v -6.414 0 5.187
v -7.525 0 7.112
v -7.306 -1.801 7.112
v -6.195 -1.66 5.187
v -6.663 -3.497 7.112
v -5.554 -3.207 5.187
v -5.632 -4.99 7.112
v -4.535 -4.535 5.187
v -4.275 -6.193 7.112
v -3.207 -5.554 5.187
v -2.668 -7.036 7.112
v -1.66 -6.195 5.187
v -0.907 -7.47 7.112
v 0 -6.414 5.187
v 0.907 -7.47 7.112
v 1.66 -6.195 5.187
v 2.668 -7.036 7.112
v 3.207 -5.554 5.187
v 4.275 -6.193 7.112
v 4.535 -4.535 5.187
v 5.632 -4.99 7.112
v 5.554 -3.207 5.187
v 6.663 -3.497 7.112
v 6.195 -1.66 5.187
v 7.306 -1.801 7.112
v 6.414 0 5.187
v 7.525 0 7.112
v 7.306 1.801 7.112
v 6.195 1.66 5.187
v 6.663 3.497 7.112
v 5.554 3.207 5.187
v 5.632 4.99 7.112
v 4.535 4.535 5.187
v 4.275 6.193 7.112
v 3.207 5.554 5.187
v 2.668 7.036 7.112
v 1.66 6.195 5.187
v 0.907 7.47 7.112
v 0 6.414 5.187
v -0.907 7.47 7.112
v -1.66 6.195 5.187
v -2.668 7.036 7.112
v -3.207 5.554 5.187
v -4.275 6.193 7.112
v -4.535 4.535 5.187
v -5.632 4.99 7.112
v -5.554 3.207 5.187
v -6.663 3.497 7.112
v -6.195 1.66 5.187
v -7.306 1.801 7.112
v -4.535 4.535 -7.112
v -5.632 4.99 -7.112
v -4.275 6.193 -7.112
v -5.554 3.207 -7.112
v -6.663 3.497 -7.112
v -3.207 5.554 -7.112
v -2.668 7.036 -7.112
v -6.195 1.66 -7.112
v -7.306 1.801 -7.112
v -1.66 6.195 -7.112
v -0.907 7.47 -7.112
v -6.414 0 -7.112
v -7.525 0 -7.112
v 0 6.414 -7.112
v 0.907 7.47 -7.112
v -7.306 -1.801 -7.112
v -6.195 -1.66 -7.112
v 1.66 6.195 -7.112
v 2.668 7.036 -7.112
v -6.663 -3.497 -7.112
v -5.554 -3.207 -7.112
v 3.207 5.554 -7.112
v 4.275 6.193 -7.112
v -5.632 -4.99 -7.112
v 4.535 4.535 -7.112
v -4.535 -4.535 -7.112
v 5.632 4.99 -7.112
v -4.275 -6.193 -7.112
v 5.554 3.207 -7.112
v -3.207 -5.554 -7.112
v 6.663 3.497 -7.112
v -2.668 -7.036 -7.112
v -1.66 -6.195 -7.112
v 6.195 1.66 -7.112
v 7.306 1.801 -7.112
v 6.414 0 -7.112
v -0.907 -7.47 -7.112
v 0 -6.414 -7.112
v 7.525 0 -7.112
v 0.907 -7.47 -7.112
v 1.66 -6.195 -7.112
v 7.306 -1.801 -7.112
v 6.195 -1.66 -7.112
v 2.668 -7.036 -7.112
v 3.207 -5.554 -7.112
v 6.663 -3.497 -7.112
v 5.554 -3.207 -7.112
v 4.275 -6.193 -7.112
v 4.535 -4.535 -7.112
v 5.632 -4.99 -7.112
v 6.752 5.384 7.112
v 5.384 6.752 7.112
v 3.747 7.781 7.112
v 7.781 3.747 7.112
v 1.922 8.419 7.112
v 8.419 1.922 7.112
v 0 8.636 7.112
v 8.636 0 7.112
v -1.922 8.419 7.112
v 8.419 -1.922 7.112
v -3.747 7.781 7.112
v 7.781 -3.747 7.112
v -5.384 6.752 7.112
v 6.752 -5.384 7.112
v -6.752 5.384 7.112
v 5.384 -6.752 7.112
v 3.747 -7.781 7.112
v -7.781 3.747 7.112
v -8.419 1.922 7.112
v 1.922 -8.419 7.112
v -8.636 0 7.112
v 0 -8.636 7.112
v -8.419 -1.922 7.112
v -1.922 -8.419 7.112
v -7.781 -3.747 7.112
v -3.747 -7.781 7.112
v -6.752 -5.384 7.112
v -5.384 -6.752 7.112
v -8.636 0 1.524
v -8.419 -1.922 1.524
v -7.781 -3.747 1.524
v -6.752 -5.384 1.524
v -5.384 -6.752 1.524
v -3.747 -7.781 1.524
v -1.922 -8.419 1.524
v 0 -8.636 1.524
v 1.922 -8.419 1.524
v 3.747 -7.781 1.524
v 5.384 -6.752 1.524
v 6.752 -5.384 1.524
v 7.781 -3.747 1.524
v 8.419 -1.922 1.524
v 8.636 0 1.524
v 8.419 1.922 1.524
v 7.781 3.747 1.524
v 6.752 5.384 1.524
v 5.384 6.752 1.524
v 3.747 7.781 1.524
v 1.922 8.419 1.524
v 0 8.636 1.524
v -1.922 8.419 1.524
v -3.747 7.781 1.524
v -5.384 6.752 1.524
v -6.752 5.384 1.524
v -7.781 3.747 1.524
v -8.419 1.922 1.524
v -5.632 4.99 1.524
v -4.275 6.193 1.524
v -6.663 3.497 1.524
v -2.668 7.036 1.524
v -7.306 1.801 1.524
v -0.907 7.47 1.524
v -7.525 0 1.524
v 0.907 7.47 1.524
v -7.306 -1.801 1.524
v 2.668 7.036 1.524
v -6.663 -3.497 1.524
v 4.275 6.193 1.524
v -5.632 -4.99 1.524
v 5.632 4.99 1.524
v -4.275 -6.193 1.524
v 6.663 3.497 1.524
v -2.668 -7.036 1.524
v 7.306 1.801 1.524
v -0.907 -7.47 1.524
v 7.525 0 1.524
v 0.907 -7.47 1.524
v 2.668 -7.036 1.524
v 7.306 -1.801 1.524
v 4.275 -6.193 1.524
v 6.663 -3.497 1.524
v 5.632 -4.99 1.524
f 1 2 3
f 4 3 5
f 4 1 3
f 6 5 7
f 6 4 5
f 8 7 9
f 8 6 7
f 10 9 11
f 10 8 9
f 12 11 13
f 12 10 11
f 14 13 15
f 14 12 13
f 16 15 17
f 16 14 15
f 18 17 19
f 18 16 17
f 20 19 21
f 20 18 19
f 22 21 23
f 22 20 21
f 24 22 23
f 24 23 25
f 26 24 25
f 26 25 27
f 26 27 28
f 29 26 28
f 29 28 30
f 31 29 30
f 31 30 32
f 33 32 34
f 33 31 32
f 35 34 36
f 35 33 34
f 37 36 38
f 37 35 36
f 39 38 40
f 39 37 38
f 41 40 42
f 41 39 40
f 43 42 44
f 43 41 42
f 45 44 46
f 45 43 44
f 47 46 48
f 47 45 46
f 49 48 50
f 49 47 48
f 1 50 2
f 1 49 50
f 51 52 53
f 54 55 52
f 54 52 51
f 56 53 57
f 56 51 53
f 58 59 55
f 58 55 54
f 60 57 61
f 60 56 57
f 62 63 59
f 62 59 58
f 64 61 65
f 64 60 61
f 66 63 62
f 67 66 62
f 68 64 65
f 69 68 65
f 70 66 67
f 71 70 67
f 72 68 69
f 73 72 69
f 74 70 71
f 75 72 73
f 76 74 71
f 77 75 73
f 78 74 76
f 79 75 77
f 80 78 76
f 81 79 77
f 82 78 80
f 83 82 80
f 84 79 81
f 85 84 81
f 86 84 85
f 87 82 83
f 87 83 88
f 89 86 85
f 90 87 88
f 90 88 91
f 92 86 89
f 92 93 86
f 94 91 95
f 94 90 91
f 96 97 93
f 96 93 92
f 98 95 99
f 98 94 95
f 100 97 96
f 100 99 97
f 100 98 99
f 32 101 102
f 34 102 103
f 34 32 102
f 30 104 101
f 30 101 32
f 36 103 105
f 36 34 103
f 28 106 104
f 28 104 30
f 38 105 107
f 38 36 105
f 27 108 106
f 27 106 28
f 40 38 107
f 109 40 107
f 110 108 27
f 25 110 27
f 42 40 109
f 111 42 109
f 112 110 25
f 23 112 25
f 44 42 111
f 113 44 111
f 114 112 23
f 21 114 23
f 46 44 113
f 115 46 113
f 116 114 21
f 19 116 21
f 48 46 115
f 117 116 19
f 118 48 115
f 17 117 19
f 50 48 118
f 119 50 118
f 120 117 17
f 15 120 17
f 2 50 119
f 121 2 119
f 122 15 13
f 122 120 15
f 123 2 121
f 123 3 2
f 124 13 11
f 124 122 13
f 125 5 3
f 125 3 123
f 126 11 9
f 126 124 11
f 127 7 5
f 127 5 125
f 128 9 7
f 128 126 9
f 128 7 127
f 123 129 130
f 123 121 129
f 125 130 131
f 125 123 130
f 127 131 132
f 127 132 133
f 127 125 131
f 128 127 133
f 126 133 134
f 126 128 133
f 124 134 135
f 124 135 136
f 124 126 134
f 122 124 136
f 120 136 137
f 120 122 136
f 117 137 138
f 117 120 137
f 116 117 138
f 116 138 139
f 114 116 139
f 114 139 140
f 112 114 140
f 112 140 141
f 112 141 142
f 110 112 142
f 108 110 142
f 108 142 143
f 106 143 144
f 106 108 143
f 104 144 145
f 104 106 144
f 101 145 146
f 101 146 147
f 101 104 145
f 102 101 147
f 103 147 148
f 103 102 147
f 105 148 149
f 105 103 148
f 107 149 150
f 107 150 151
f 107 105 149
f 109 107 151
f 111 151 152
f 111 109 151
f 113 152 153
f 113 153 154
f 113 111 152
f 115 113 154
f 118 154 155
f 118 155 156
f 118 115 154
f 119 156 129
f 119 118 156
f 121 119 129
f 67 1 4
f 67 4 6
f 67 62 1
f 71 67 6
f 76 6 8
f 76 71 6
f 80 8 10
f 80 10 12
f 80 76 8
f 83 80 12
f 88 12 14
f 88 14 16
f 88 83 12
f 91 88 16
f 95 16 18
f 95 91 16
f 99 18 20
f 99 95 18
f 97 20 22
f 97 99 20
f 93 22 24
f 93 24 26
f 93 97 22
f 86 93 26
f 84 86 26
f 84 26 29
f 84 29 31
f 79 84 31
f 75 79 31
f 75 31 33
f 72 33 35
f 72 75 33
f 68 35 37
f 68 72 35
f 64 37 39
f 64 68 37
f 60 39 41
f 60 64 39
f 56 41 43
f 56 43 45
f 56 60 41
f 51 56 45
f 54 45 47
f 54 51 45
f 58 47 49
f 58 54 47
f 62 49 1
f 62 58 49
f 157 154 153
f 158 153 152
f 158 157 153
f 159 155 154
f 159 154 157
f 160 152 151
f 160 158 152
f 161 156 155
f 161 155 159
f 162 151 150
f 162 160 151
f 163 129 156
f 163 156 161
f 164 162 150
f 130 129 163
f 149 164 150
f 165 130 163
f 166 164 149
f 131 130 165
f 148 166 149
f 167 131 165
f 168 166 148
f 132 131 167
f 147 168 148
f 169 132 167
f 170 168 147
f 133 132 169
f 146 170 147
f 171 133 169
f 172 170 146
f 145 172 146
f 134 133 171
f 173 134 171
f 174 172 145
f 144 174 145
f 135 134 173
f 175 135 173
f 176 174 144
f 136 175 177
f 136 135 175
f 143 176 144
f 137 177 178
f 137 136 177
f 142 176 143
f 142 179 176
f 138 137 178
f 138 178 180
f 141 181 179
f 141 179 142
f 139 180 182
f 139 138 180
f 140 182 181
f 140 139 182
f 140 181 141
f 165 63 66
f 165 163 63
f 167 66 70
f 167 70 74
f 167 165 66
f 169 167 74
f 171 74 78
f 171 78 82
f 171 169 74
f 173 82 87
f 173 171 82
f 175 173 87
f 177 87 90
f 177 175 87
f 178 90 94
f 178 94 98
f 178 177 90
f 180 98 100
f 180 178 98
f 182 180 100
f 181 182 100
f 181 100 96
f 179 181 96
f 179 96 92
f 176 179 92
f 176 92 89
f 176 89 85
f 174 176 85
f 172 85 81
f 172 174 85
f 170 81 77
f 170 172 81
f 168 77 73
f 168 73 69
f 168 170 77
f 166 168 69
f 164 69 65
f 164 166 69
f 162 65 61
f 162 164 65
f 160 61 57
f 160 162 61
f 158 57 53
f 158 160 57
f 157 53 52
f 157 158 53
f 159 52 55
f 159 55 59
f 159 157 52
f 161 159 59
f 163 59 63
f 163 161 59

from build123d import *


with BuildPart() as part:
    # Sketch1 → Revolve1 (revolve)
    with BuildSketch(Plane(origin=(0, 0, 0), x_dir=(0, 0, -1), z_dir=(1, 0, 0)), mode=Mode.PRIVATE) as revolve1_sk:
        Polygon((-7.112, 7.52475), (-5.18725854, 6.4135), (7.112, 6.4135), (7.112, 7.52475), (-1.524, 7.52475), (-1.524, 8.636), (-7.112, 8.636), align=None)
    revolve(revolve1_sk.sketch.rotate(Axis((0, 0, -7.112), (0, 0, 1)), 90), axis=Axis((0, 0, -7.112), (0, 0, 1)))


solid = part.part
